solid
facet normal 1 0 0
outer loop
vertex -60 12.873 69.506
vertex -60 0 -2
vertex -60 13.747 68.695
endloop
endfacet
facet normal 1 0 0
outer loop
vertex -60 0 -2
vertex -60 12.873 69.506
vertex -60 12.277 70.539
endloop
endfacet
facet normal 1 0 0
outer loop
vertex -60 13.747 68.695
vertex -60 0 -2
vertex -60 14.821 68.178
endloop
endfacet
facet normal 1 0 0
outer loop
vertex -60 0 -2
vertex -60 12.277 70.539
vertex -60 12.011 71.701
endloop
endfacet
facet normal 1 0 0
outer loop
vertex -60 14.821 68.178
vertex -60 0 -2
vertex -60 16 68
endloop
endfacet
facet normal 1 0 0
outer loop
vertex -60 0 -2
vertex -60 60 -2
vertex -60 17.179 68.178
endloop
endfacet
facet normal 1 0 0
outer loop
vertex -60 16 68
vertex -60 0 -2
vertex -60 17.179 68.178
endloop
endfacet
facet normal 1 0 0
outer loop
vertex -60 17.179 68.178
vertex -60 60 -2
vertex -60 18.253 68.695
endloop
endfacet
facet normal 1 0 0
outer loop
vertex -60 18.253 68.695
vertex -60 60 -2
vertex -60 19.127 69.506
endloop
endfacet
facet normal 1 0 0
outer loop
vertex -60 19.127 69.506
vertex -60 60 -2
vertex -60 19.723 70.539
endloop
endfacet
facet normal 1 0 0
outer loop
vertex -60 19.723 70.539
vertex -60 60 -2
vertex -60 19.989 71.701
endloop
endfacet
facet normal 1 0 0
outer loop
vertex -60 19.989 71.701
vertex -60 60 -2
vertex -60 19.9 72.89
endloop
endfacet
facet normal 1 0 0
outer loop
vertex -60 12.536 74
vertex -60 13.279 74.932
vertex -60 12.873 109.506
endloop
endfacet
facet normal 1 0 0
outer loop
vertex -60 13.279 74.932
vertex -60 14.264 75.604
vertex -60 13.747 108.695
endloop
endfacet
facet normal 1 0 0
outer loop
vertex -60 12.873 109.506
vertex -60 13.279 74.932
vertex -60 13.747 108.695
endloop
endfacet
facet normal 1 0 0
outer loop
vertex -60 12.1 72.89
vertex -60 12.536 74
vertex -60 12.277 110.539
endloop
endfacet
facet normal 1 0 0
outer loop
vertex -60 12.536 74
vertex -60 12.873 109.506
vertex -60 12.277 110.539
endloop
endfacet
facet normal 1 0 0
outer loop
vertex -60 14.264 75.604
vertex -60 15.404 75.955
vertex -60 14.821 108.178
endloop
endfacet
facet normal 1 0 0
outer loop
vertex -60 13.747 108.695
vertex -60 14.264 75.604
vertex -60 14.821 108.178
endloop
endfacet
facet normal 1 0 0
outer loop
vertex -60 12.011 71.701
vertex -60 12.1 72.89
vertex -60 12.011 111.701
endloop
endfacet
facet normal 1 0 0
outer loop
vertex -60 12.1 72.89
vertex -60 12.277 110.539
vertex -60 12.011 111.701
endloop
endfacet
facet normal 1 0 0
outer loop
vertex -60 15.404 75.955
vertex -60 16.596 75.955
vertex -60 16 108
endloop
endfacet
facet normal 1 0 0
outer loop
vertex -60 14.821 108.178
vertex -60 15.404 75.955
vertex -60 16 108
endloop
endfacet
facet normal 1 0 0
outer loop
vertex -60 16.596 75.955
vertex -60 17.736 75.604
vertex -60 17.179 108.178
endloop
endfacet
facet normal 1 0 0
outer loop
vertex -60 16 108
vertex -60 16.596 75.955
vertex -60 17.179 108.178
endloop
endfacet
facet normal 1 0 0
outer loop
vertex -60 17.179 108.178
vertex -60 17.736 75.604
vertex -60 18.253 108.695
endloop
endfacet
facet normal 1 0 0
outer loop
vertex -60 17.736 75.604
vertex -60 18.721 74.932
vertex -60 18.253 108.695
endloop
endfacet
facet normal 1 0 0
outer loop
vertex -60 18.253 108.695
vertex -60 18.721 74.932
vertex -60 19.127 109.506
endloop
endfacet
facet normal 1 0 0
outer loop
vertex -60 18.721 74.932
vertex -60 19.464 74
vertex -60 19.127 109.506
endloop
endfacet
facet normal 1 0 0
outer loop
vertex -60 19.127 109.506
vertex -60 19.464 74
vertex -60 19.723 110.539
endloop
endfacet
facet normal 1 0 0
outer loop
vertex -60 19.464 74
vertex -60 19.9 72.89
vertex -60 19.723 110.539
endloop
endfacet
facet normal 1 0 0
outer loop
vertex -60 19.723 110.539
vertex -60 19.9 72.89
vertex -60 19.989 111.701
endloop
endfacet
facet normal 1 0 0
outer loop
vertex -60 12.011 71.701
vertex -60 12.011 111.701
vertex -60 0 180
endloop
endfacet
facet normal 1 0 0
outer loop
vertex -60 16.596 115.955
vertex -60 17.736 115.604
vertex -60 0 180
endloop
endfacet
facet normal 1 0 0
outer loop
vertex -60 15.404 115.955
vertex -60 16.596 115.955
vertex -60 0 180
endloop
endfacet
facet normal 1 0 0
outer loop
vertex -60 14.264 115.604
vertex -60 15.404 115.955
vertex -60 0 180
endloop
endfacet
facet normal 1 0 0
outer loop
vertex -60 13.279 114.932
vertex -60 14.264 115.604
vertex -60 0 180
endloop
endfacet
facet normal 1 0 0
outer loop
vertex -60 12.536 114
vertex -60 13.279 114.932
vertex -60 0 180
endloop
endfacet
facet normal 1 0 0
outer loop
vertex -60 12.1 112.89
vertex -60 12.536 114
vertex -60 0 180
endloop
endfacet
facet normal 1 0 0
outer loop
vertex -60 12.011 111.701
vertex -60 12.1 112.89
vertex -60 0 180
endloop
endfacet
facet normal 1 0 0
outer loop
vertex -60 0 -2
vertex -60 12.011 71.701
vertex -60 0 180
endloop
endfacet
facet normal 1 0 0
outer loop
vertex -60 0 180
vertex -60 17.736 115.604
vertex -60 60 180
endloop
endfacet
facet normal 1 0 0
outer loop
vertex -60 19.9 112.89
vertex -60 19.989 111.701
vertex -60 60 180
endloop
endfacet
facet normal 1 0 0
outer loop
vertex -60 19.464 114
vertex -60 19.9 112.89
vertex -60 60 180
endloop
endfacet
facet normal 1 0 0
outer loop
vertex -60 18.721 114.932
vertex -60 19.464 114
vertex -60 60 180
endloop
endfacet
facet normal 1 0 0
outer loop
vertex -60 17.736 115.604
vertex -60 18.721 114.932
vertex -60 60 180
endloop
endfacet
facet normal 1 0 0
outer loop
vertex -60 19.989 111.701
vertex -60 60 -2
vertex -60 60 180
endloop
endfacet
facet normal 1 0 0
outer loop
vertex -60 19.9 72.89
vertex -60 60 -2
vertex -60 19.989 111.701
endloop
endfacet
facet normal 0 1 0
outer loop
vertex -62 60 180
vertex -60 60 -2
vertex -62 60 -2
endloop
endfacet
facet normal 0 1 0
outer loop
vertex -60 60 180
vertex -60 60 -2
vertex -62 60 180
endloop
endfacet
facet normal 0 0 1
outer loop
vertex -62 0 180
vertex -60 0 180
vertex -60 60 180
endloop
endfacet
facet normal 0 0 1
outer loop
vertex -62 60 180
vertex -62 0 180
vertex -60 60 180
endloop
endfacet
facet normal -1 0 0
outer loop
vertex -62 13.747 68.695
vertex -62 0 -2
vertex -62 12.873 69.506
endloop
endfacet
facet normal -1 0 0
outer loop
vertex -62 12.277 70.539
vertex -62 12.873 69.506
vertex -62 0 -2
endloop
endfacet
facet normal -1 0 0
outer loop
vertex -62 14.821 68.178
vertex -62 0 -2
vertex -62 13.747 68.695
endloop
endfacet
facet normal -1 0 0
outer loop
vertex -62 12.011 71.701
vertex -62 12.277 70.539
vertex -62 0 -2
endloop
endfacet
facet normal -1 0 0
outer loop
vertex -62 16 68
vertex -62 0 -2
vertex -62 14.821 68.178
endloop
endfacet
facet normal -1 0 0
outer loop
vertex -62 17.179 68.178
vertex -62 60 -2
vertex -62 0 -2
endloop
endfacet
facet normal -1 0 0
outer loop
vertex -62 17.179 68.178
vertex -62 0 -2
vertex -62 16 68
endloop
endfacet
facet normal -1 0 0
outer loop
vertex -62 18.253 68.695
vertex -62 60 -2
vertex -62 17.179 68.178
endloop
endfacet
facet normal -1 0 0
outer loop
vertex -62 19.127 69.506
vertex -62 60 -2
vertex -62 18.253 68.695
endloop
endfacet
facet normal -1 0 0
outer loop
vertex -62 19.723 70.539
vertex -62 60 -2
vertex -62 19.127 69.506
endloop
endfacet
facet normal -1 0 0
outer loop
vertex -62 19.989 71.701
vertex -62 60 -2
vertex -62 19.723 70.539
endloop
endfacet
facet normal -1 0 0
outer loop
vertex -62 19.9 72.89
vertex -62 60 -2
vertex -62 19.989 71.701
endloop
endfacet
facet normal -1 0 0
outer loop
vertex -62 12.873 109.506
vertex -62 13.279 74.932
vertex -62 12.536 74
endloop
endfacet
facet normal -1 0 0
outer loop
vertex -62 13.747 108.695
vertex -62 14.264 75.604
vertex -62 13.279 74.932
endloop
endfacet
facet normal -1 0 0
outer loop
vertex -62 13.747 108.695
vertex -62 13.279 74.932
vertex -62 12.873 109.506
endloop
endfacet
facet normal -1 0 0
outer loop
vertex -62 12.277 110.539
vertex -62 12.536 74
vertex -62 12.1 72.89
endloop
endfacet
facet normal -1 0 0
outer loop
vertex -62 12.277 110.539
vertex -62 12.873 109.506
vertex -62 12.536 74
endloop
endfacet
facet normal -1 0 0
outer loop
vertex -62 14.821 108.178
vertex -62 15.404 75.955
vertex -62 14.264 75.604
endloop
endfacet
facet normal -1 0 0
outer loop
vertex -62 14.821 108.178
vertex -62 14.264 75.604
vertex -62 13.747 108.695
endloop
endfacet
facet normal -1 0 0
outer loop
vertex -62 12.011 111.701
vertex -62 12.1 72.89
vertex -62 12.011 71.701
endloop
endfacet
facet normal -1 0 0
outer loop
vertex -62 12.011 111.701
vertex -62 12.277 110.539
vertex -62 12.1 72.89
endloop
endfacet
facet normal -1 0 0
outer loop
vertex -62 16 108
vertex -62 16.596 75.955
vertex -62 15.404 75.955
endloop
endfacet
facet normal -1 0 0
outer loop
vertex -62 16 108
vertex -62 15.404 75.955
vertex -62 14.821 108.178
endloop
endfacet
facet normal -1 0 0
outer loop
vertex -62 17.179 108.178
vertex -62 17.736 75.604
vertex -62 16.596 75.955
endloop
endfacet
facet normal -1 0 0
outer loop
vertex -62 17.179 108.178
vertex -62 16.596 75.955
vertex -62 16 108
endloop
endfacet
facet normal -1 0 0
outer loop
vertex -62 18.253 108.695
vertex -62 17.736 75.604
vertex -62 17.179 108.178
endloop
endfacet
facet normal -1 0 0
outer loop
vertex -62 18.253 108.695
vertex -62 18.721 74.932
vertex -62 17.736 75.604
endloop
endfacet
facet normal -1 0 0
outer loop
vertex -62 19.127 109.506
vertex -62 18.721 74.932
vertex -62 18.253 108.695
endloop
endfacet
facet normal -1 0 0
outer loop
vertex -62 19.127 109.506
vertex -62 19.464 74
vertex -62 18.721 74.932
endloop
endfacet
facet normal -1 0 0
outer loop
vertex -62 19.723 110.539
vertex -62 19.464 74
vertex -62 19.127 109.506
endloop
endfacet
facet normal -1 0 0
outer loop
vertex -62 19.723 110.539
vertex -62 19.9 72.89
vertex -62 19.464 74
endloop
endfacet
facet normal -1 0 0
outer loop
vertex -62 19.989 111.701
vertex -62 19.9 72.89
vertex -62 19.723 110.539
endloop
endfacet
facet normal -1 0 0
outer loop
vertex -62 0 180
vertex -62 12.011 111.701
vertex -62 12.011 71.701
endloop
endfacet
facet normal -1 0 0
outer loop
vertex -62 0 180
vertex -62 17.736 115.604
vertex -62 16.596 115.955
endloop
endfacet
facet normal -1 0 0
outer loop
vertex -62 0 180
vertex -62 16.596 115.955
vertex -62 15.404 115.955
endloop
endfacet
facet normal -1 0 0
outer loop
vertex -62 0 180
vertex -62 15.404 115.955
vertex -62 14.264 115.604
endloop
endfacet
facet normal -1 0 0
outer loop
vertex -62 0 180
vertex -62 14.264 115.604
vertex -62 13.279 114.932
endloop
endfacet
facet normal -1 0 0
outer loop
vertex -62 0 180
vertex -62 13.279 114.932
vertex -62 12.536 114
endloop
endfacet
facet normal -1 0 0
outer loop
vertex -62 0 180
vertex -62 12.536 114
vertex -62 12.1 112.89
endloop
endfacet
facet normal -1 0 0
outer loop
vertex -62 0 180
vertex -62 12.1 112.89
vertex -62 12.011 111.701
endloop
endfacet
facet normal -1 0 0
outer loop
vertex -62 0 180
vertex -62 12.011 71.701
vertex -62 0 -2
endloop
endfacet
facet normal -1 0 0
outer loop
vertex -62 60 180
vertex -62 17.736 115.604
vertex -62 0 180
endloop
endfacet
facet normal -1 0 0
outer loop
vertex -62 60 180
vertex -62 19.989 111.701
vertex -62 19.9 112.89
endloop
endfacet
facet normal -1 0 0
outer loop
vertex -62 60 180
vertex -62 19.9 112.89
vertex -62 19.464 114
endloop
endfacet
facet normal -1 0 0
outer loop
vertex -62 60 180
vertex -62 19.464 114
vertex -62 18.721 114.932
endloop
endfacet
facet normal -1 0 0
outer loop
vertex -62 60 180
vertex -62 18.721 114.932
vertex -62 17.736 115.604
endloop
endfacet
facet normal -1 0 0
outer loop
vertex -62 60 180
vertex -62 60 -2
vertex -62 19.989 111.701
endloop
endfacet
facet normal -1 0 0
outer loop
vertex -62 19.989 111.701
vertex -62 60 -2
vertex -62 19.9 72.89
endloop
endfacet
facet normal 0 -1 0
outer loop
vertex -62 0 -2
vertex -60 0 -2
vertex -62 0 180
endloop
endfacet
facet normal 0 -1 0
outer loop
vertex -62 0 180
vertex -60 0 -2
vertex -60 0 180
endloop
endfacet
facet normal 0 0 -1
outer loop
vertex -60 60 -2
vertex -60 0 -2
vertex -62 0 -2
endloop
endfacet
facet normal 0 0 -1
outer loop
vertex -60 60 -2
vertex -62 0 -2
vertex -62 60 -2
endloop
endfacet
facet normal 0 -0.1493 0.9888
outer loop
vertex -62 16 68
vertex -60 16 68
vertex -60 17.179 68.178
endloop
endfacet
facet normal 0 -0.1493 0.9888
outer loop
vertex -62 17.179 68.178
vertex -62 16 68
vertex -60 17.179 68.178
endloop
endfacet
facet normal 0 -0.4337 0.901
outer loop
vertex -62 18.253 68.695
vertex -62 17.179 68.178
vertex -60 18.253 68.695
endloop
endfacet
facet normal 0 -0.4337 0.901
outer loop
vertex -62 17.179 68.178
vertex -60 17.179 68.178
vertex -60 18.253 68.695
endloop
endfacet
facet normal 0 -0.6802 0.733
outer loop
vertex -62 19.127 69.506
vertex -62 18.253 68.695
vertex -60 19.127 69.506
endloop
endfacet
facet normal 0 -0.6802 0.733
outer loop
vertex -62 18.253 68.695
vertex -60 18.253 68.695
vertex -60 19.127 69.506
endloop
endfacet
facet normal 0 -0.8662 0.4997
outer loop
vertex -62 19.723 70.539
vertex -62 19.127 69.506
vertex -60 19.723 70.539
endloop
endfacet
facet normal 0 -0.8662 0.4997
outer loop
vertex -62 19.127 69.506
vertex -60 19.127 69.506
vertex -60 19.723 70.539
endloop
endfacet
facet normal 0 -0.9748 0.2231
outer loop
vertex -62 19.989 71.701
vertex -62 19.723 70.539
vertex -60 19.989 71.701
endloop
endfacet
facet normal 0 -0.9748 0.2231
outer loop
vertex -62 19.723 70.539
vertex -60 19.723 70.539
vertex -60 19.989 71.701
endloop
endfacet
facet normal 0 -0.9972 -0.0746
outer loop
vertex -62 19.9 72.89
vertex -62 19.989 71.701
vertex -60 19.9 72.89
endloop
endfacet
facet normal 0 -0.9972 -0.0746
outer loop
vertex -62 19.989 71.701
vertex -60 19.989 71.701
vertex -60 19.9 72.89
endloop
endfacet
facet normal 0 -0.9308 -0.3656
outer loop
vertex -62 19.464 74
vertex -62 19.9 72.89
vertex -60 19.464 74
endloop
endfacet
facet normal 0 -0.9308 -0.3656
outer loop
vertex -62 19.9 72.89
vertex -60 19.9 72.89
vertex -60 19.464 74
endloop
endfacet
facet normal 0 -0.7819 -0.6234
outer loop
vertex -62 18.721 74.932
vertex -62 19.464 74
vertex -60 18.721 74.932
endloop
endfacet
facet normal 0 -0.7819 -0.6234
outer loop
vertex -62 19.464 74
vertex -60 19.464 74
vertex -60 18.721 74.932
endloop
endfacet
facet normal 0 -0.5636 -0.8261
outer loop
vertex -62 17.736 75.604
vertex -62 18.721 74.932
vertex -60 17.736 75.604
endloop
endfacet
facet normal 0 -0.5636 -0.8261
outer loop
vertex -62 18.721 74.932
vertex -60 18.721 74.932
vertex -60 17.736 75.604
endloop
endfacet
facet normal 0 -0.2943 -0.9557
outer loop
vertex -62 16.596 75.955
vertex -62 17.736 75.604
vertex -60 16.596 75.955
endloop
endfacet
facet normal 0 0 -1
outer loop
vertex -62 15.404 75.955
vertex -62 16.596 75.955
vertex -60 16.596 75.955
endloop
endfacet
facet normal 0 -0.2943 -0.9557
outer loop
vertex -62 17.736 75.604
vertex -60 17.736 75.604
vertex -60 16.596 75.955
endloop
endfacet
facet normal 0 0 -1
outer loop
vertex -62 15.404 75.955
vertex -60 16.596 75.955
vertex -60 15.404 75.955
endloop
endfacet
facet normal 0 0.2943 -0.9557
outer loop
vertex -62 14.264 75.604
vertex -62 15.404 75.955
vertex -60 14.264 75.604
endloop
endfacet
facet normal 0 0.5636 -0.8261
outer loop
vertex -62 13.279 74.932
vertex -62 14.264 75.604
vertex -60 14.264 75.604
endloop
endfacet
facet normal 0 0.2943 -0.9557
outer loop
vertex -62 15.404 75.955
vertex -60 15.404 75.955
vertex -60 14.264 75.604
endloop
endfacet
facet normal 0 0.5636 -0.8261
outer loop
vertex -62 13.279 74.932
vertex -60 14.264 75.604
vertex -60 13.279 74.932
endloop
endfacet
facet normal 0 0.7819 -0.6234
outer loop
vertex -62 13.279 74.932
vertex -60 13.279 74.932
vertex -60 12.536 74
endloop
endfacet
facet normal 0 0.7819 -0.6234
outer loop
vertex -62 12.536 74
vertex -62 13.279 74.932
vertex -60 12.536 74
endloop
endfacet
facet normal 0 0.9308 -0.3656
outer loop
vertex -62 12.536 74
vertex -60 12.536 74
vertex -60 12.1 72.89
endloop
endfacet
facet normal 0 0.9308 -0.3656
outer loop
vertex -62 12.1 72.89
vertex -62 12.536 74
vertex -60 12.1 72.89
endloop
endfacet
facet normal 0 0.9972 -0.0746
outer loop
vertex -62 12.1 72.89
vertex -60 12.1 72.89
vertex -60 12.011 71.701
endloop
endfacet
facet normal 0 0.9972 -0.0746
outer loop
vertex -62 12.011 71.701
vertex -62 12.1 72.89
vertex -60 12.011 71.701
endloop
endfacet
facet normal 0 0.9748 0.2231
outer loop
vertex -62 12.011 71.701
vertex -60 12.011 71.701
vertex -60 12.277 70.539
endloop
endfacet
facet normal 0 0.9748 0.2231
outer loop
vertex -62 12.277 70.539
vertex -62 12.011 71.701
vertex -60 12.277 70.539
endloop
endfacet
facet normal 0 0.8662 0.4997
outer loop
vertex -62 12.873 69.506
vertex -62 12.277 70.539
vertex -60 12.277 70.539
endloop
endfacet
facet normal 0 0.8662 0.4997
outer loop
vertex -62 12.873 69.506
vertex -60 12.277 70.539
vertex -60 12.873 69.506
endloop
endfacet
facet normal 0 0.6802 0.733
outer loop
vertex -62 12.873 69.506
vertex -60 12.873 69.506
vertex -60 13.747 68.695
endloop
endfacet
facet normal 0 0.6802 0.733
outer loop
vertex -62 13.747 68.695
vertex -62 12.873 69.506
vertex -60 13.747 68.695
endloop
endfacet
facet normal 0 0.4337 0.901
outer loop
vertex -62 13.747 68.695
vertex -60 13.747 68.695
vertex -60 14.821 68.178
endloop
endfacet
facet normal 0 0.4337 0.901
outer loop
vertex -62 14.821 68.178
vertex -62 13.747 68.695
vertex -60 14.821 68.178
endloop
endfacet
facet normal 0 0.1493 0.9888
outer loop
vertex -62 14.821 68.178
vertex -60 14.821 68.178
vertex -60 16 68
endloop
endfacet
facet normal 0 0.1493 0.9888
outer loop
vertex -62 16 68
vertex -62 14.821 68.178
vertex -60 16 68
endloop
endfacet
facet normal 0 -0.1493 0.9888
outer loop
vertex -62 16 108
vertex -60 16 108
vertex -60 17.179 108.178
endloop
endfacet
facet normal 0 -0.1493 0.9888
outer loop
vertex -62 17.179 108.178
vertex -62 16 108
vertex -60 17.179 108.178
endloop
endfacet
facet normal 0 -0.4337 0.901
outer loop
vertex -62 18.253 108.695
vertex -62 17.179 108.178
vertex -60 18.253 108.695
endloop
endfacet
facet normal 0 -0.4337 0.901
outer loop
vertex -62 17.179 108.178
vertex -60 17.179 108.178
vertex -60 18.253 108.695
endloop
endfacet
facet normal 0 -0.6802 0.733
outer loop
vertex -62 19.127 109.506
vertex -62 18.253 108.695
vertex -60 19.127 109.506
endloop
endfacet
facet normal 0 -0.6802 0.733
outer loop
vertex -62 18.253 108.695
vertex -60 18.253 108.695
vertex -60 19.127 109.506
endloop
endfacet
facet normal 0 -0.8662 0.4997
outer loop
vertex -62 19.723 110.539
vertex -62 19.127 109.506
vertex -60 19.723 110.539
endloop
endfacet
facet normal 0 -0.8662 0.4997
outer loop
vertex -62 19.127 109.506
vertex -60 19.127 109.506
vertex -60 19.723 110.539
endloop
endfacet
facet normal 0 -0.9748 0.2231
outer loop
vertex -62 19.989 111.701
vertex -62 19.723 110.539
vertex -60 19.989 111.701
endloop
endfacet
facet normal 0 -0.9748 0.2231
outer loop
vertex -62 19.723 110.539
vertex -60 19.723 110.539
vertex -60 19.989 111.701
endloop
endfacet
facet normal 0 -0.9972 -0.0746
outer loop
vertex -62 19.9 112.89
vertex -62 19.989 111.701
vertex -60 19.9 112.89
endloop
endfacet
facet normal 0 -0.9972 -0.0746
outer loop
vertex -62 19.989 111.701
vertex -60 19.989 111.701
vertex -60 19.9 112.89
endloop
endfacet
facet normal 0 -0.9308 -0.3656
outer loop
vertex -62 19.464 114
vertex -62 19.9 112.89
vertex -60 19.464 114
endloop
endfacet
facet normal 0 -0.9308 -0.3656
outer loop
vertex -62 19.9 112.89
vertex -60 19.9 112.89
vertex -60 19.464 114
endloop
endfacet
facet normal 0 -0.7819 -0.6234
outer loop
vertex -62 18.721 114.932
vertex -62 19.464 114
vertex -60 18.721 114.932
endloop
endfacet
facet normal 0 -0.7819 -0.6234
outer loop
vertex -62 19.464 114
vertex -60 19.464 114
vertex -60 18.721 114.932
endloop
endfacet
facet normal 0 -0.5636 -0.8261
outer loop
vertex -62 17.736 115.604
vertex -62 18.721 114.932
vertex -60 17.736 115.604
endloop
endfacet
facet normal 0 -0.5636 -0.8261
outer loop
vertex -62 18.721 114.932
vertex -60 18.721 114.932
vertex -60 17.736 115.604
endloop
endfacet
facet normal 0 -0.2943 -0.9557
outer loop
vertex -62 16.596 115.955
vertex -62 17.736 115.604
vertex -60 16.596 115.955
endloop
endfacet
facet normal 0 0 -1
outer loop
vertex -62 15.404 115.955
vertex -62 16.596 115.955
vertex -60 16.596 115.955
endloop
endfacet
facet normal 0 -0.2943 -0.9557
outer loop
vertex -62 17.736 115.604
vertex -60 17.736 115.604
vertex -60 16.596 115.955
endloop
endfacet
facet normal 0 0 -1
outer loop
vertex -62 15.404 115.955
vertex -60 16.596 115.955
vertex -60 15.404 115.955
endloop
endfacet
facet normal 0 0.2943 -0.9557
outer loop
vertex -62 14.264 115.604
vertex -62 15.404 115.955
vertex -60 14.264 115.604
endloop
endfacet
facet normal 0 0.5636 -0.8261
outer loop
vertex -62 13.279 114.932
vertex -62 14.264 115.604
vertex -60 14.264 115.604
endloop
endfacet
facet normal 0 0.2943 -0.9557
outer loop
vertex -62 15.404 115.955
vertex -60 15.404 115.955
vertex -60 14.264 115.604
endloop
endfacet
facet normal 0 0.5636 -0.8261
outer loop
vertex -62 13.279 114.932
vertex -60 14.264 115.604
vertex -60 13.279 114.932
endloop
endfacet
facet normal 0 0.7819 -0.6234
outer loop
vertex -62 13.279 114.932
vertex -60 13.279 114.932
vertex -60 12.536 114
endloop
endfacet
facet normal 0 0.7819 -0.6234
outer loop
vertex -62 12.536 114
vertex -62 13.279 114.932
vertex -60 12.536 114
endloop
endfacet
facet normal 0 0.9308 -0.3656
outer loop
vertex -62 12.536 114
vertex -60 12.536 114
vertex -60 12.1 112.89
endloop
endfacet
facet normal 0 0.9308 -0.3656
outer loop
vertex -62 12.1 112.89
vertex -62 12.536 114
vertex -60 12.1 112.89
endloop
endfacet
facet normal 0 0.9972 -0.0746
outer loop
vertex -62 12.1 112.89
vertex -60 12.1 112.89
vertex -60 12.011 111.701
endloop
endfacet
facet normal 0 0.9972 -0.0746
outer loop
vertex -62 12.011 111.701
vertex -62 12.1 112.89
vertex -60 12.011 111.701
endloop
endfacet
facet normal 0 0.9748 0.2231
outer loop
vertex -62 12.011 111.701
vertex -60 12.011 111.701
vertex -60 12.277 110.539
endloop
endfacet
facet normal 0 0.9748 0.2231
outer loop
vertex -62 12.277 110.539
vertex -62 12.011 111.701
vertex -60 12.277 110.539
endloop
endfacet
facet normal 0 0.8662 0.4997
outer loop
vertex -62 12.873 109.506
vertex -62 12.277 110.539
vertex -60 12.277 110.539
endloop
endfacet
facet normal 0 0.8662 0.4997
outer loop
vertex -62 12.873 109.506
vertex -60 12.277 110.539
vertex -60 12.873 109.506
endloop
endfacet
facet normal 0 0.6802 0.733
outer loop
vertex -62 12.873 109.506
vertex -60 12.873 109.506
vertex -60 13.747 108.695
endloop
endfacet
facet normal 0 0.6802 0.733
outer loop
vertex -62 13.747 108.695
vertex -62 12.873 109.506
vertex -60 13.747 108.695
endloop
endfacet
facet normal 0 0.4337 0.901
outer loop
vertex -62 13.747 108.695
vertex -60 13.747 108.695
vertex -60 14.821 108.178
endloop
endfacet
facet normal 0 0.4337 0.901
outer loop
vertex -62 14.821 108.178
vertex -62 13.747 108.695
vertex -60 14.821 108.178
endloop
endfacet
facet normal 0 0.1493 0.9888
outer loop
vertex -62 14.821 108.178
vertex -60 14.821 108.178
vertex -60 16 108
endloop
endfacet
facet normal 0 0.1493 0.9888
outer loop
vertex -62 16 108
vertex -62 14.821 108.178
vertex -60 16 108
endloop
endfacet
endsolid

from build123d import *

# Parameters (mm, degrees)
SKETCH2_W             = 182
SKETCH2_H             = 60
BOSS_EXTRUDE1_DEPTH   = 2
F_8_0MM_DOWEL_HOLE2_D = 8


with BuildPart() as part:
    # Sketch2 → Boss-Extrude1 (new body)
    with BuildSketch(Plane.ZY.offset(60)):
        with Locations((89, 30)):
            Rectangle(SKETCH2_W, SKETCH2_H)
    extrude(amount=BOSS_EXTRUDE1_DEPTH)

    # Ø8.0mm Dowel Hole2 (through all)
    with Locations(Plane.ZY.offset(62)):
        with Locations((112, 16), (72, 16)):
            Hole(F_8_0MM_DOWEL_HOLE2_D / 2)


solid = part.part
